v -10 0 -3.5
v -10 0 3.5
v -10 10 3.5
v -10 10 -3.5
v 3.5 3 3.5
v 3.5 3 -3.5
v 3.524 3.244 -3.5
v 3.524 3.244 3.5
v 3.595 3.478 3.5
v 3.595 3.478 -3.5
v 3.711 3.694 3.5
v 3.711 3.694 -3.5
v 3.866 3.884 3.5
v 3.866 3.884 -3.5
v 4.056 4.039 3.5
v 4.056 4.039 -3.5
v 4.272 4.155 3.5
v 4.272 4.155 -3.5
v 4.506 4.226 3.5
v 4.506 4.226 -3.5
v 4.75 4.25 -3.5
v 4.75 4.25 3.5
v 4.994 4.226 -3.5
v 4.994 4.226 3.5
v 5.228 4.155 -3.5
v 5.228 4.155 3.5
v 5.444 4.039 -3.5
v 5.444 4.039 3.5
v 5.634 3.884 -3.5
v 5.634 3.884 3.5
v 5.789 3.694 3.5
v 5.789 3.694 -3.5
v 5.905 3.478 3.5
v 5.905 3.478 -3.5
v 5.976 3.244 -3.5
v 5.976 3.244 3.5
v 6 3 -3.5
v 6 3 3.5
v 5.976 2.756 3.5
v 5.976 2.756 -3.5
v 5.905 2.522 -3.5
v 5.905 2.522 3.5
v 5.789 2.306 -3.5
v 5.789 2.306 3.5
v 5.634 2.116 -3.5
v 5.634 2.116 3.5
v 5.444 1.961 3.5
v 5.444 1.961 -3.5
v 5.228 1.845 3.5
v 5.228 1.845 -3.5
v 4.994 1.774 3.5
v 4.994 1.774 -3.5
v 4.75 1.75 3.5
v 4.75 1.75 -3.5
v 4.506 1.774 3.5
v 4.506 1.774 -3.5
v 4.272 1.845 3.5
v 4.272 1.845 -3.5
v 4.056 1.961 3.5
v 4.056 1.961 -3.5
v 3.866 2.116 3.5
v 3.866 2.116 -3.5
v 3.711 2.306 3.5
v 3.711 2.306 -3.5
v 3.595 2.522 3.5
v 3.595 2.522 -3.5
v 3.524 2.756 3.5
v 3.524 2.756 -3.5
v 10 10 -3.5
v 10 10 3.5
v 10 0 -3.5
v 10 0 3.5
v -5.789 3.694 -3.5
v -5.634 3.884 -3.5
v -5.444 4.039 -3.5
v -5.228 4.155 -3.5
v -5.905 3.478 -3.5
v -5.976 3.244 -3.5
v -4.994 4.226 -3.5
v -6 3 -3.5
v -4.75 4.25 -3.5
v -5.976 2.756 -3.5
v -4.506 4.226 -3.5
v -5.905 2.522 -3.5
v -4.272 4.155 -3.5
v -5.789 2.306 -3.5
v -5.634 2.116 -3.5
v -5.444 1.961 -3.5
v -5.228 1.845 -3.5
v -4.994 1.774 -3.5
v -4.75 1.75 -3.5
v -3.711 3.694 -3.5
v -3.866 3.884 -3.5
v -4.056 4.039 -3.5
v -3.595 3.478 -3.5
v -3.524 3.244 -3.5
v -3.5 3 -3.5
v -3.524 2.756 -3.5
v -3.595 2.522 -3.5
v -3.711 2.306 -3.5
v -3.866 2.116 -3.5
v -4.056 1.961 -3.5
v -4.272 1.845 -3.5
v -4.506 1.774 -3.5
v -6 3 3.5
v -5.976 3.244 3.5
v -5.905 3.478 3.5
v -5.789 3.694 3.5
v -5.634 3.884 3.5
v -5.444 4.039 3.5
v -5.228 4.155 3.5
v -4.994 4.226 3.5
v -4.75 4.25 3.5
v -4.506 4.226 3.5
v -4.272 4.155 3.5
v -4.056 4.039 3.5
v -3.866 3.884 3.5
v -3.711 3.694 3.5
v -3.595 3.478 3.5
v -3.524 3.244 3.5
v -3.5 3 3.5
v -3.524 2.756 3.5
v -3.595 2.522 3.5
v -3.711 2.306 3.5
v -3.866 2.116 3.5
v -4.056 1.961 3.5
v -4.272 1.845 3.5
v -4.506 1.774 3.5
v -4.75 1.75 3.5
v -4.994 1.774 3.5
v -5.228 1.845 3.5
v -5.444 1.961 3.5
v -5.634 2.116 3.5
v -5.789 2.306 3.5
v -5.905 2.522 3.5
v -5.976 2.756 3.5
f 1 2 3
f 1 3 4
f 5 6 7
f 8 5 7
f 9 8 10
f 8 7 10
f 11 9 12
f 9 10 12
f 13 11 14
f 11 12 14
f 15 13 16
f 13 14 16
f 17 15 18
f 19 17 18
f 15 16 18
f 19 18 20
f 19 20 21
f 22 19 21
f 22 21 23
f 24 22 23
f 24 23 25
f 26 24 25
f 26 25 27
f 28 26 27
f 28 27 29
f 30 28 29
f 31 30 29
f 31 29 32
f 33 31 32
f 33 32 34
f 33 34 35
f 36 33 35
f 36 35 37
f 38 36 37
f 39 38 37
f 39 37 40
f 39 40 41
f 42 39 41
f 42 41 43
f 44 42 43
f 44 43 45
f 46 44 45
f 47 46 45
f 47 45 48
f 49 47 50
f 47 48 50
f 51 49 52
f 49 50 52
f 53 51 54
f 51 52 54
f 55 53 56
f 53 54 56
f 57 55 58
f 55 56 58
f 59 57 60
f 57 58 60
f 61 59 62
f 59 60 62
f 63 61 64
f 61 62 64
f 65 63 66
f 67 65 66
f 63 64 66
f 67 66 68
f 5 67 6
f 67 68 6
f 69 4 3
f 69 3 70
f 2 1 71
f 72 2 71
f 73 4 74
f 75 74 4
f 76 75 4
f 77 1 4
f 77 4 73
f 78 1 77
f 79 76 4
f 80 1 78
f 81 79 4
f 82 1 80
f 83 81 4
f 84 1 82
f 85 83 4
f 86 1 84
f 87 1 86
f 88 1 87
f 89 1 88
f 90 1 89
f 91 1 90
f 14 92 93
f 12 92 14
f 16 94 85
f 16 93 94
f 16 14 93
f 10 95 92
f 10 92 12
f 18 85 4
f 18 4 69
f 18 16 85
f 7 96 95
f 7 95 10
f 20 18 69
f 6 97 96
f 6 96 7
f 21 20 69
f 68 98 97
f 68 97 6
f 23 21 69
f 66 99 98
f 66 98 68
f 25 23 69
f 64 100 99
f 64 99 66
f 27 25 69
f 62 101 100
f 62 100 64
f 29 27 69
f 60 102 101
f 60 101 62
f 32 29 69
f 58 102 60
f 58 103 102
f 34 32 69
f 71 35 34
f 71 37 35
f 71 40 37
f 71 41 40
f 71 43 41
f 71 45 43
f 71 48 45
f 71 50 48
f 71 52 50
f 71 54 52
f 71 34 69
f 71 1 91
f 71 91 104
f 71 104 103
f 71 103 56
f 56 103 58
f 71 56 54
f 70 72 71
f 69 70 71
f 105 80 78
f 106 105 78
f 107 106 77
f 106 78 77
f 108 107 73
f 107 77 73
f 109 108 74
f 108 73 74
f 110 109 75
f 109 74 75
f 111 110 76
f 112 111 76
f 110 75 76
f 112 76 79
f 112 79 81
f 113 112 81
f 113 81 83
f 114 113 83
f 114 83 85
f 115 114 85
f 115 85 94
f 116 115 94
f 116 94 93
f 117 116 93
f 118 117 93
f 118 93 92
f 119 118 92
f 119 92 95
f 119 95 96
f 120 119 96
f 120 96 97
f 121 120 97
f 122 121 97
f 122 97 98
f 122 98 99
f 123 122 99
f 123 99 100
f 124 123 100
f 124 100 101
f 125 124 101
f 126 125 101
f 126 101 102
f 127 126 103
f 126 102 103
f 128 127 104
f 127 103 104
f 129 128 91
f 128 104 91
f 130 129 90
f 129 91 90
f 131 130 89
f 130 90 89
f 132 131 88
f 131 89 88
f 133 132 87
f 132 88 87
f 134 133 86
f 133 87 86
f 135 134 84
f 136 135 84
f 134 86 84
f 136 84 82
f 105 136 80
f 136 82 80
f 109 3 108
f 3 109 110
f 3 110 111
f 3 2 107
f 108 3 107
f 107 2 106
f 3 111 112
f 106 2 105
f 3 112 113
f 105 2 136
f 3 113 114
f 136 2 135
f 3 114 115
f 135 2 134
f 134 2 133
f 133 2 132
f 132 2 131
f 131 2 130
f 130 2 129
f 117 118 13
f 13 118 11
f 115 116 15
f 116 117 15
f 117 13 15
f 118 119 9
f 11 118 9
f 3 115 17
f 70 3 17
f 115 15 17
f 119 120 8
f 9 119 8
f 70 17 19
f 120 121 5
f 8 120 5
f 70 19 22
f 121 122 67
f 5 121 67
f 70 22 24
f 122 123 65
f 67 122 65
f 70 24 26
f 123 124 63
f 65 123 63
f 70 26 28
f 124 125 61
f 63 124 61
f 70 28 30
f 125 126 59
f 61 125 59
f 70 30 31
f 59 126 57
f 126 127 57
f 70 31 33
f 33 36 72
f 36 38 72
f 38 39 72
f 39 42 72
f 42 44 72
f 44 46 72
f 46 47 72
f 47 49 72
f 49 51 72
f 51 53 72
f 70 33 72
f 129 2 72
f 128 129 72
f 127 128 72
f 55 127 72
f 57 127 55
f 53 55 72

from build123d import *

# Parameters (mm, degrees)
CROQUIS1_W              = 20
CROQUIS1_H              = 7
SALIENTE_EXTRUIR1_DEPTH = 10
TALADRO1_D              = 2.5


with BuildPart() as part:
    # Croquis1 → Saliente-Extruir1 (new body)
    with BuildSketch(Plane(origin=(0, 0, 0), x_dir=(1, 0, 0), z_dir=(0, 1, 0))):
        Rectangle(CROQUIS1_W, CROQUIS1_H)
    extrude(amount=SALIENTE_EXTRUIR1_DEPTH)

    # Taladro1 (through all)
    with Locations(Plane.XY.offset(3.5)):
        with Locations((-4.75, 3), (4.75, 3)):
            Hole(TALADRO1_D / 2)


solid = part.part
